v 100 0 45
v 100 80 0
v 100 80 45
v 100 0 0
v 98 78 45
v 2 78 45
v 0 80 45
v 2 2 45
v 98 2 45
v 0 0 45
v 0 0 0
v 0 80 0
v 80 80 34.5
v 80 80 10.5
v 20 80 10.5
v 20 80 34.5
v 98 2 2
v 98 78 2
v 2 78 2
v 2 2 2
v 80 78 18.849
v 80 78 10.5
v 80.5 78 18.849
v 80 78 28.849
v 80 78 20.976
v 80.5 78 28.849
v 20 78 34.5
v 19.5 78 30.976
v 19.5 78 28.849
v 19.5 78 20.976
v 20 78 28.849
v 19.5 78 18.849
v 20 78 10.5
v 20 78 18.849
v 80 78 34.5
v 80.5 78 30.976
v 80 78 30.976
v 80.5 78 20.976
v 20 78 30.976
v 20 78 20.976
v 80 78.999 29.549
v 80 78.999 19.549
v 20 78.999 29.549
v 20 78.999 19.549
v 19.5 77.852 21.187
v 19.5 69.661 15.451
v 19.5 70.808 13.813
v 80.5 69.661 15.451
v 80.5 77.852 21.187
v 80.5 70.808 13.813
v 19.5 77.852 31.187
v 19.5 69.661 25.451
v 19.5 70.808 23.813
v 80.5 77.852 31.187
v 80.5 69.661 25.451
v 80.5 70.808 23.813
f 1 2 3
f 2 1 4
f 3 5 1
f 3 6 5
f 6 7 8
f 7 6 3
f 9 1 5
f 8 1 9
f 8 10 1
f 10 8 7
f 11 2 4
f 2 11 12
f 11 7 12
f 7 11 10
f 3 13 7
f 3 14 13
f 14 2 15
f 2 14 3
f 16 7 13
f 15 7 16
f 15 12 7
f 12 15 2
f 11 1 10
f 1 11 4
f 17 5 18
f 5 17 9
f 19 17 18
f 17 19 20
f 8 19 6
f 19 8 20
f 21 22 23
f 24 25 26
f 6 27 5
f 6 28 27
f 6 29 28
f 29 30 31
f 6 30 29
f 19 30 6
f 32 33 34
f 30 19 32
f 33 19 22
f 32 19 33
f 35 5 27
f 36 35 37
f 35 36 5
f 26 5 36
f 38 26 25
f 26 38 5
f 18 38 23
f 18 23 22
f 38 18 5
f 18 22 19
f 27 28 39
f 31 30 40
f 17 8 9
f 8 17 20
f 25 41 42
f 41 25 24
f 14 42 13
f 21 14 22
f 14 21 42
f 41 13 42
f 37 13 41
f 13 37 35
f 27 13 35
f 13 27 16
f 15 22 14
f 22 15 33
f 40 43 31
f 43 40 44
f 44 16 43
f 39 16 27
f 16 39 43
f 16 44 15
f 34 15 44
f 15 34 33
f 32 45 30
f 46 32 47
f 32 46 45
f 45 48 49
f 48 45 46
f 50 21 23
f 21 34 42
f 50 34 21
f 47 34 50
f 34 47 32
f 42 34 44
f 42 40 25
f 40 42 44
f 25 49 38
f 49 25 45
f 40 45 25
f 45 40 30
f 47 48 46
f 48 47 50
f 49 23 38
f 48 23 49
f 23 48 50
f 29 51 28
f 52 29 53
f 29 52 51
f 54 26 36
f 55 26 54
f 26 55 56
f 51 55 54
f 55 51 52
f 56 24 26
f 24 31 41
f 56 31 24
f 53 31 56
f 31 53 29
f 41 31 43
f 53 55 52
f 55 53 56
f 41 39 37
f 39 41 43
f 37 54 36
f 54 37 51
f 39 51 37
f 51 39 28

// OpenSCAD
$fn = 32;

// ----------------------------------------------------------------------
// Vent box: louvers enclosure
// ----------------------------------------------------------------------

// --- parameters (mm) ---
box_l = 100;              // box length, X
box_w = 80;               // box width, Y
box_h = 45;               // box height, Z
wall_t = 2;               // shell wall thickness
win_l = 60;               // vent window width, X
win_h = 24;               // vent window height, Z
slat_t = 2;               // louver slat thickness
slat_d = 10;              // louver slat depth
slat_a = 35;              // louver slat angle, degrees
slat_pitch = 10;          // louver pitch
slat_yc = 74.33;          // slat centreline Y

win_z0 = (box_h - win_h) / 2;  // window lower edge Z
n_slats = 2;  // louver count
slat_z0 = win_z0 + (win_h - (n_slats - 1) * slat_pitch) / 2;

difference() {
  union() {
    difference() {
      cube([box_l, box_w, box_h]);
  translate([wall_t, wall_t, wall_t])
    cube([box_l - 2 * wall_t, box_w - 2 * wall_t, box_h]);
  translate([(box_l - win_l) / 2, box_w - wall_t - 1, win_z0])
    cube([win_l, wall_t + 2, win_h]);
    }
    for (i = [0 : n_slats - 1])
      translate([box_l / 2, slat_yc, slat_z0 + i * slat_pitch])
        rotate([slat_a, 0, 0])
          cube([win_l + 1, slat_d, slat_t], center = true);
  }
}
